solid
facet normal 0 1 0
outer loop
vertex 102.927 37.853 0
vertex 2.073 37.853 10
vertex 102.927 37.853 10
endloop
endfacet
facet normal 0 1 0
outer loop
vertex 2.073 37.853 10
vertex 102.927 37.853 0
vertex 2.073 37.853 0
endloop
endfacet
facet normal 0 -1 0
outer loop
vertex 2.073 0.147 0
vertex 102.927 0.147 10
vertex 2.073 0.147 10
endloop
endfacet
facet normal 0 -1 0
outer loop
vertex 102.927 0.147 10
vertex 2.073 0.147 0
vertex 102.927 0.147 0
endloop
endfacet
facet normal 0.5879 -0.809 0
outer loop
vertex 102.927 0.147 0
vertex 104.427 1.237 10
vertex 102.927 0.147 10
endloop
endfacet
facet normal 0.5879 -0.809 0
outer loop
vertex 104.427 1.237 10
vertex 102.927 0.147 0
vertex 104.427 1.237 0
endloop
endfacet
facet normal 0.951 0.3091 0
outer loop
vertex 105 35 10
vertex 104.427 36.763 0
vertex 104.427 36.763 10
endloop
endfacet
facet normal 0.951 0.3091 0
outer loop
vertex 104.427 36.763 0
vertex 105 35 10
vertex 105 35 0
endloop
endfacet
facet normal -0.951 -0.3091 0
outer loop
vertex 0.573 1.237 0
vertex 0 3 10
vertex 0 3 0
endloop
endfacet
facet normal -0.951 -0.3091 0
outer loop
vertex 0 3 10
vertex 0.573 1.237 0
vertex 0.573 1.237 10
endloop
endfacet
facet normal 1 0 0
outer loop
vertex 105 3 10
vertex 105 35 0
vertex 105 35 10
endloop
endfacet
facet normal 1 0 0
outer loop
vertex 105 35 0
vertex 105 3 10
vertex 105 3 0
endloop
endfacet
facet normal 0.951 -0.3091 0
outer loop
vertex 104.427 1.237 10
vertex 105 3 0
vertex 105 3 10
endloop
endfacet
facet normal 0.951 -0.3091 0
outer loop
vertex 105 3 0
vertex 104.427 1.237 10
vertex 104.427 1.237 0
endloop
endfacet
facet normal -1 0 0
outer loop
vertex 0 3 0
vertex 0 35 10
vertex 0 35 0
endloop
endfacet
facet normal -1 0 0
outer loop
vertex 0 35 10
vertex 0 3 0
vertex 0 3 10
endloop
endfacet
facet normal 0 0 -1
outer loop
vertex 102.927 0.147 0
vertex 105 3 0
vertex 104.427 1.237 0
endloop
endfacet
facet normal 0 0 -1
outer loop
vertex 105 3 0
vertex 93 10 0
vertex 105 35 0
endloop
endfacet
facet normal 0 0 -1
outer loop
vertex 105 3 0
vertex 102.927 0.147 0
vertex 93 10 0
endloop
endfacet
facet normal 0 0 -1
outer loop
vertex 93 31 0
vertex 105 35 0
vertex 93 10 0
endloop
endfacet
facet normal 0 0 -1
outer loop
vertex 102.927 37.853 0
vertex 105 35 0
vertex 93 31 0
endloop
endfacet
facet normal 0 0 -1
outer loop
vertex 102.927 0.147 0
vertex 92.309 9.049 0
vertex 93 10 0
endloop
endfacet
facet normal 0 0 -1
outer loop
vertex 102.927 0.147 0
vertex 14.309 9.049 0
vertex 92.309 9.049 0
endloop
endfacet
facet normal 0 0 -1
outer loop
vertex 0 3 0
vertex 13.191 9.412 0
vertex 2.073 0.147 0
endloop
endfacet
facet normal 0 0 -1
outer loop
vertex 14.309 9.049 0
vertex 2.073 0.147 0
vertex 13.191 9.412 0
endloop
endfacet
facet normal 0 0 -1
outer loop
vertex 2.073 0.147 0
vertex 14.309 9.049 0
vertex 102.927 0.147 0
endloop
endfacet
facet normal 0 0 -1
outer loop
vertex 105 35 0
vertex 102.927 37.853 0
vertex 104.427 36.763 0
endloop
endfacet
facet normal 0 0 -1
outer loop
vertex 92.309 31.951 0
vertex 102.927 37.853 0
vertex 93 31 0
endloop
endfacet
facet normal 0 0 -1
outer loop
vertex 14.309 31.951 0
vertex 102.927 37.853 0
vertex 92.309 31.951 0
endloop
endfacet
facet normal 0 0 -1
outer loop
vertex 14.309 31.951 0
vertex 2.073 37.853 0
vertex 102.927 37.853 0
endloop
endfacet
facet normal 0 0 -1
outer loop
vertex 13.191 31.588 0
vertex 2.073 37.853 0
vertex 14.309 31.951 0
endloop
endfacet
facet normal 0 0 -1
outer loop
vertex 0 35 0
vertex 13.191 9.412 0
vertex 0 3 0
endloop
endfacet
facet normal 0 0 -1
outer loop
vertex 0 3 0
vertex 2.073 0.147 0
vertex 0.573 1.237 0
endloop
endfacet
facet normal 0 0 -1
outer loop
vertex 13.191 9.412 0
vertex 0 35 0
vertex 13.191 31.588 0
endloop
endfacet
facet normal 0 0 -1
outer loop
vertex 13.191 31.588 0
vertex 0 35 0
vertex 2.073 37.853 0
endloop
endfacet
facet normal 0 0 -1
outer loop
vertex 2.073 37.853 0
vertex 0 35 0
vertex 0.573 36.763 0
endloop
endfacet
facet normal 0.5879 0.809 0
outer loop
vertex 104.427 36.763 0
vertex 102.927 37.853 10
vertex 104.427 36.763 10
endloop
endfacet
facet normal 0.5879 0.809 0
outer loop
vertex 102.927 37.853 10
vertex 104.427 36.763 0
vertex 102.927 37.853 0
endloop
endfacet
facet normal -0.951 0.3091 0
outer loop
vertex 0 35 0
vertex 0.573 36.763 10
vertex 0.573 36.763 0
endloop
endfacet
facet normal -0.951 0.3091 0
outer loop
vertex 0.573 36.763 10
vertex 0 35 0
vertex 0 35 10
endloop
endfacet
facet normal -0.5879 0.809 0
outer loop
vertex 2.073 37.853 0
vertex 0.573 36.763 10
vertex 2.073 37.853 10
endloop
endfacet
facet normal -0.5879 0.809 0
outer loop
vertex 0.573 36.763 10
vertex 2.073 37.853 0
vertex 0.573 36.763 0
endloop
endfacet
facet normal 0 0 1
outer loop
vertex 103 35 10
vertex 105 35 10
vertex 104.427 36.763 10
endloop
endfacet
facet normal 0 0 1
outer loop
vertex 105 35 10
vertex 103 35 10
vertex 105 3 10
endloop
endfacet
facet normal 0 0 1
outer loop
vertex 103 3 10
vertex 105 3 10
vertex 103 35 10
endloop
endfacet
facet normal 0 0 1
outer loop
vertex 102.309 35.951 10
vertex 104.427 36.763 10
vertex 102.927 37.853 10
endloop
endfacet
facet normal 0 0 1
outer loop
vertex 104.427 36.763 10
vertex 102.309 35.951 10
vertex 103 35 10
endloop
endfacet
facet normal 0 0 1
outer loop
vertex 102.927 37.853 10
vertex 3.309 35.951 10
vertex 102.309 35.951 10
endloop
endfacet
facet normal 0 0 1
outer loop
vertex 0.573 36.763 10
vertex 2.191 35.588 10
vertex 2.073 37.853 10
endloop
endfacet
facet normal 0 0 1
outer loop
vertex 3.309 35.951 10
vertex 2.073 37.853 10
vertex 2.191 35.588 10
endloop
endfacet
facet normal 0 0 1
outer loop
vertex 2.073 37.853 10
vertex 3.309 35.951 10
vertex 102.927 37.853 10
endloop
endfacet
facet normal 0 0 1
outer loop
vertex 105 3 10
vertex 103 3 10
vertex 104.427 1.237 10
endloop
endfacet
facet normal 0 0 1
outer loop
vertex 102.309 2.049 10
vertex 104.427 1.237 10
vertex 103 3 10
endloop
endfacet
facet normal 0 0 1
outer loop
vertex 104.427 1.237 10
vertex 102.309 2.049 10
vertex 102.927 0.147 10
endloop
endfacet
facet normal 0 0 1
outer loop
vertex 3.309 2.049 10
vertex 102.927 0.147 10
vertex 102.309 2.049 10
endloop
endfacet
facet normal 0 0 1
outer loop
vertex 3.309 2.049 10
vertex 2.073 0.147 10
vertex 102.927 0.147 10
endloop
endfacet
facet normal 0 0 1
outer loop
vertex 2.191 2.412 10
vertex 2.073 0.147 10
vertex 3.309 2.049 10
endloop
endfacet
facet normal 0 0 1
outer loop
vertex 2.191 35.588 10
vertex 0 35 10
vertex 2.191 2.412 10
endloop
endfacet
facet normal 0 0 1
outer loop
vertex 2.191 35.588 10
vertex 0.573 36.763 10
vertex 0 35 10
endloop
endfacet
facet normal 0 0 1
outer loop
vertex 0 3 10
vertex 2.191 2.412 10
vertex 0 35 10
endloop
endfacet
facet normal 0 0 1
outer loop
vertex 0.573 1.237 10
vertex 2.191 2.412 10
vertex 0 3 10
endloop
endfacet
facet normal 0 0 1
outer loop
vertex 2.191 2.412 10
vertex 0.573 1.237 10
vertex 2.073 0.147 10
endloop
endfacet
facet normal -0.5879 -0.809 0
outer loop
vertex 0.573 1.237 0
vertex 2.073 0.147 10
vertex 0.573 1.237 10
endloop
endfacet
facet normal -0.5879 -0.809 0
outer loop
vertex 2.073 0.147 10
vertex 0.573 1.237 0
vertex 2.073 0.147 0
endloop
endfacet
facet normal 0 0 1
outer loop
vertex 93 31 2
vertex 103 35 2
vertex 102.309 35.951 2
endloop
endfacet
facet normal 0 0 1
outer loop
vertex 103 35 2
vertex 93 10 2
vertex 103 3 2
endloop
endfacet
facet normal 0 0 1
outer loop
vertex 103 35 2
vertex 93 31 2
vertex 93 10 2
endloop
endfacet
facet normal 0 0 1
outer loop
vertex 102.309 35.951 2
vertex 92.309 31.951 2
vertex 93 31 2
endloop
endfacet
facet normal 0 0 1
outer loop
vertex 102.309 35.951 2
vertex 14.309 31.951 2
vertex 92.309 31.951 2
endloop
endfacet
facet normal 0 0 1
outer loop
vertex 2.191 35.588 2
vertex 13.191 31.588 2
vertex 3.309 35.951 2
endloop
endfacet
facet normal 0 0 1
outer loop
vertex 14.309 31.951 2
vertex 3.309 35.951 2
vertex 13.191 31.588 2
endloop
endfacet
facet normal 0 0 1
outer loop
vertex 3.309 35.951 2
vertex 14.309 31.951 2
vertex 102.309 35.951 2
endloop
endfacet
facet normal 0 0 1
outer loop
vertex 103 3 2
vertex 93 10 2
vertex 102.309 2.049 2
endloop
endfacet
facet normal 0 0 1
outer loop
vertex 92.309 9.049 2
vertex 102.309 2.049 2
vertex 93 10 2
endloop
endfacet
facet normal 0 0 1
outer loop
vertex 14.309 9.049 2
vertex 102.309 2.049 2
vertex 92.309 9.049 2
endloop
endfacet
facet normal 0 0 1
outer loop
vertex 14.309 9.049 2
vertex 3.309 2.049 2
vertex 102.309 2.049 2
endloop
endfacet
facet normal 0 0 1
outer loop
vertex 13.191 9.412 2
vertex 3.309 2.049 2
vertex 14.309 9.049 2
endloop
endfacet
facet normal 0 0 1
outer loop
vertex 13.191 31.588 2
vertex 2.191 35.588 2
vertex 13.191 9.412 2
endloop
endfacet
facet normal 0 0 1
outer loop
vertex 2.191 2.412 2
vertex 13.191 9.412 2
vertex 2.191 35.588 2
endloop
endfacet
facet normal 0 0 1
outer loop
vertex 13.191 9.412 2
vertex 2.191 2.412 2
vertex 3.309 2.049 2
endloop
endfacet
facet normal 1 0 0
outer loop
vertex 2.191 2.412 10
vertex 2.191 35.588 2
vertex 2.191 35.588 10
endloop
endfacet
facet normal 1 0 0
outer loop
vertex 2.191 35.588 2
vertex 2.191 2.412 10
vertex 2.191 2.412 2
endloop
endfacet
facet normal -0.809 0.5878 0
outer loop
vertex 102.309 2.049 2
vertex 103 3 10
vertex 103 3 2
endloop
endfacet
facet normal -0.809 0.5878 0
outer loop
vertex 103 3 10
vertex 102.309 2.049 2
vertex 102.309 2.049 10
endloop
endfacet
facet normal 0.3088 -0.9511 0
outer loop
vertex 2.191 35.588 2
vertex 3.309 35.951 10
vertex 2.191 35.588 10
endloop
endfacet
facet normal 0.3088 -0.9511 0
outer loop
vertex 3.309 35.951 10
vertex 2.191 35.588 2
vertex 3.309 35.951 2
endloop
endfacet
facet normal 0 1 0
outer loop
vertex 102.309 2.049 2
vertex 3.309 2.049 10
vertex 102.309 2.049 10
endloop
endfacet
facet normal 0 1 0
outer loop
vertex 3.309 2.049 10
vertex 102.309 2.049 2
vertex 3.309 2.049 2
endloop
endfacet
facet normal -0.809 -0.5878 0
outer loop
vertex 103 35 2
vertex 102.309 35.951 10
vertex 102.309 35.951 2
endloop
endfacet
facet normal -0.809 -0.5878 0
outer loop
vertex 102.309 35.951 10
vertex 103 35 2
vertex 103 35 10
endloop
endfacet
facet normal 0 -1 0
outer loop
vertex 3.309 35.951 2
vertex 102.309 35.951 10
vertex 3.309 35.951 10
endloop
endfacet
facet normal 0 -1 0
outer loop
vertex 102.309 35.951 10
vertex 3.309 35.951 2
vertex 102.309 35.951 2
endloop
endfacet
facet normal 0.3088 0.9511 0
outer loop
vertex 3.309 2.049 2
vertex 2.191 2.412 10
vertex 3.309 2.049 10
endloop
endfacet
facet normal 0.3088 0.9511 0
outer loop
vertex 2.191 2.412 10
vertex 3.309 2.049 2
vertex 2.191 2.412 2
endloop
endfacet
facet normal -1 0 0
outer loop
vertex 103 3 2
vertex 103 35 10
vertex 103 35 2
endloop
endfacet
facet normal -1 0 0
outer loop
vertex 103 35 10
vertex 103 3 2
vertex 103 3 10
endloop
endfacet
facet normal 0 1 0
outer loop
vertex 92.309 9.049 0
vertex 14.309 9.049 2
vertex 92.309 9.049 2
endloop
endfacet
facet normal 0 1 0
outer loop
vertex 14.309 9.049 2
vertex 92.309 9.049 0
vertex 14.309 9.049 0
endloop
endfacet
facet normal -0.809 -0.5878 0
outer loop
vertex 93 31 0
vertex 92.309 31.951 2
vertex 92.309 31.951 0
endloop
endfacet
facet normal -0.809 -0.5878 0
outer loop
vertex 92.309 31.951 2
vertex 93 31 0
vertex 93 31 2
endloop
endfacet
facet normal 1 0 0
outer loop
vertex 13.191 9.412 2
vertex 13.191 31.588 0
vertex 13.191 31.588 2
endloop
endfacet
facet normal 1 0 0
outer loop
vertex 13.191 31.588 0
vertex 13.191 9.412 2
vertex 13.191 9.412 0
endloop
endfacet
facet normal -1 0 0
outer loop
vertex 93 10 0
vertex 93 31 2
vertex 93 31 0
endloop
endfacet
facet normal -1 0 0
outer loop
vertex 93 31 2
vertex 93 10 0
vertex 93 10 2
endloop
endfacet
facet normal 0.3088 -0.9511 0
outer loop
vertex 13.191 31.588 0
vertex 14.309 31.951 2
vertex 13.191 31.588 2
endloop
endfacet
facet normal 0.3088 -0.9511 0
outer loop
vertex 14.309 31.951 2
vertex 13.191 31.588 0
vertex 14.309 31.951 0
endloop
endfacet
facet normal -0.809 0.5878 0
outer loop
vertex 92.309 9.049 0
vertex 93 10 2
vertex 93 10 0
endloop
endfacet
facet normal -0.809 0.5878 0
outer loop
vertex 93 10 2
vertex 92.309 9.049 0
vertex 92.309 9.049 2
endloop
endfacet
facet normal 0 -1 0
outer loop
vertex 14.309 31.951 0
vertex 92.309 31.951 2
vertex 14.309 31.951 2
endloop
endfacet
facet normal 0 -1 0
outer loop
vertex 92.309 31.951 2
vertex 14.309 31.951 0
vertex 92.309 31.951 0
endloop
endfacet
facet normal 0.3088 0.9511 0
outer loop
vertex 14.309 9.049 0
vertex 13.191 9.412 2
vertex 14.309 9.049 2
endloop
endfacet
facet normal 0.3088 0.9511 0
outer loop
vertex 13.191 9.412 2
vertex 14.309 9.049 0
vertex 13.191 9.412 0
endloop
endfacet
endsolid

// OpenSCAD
// Parameterized Tray - Rounded Box with Thickness
// Dimensions: Width x Breadth x Height with wall thickness and corner radius

// Parameters
width = 101+4;     // Outer width (mm)
breadth = 34+4;    // Outer breadth/depth (mm)
height = 10;     // Outer height (mm)
thickness = 2;  // Wall thickness (mm)
width2 = width - (2*thickness);
breadth2 = breadth - (2*thickness);
height2 = 10;    // Inner height (mm)

radius = 3;      // Corner radius (mm)
radius2 = 1;

width3 = 80;
breadth3 = 23;
height3 = 20;
radius3 = 1;

// Note: Ensure thickness < width/2, breadth/2, and radius < thickness/2 for valid geometry

// Main tray module
module tray() {
    difference() {
        // Outer shell
        rounded_box(width, breadth, height, radius);

        // Inner cavity (hollow out the tray)
        translate([thickness, thickness, thickness])
            rounded_box(width2, breadth2, height2, radius2);
    }
}

// Helper module for rounded box
module rounded_box(w, b, h, r) {
    hull() {
        // Bottom corners
        translate([r, r, 0]) cylinder(h = h, r = r);
        translate([w - r, r, 0]) cylinder(h = h, r = r);
        translate([r, b - r, 0]) cylinder(h = h, r = r);
        translate([w - r, b - r, 0]) cylinder(h = h, r = r);
    }
}

module cutout() {
    translate([13, 9, -5])
            rounded_box(width3, breadth3, height3, radius3);
}

module tray_with_cutout() {
    difference() {
        tray();

        cutout();
    }
}

// Render the tray with cutout
tray_with_cutout();
